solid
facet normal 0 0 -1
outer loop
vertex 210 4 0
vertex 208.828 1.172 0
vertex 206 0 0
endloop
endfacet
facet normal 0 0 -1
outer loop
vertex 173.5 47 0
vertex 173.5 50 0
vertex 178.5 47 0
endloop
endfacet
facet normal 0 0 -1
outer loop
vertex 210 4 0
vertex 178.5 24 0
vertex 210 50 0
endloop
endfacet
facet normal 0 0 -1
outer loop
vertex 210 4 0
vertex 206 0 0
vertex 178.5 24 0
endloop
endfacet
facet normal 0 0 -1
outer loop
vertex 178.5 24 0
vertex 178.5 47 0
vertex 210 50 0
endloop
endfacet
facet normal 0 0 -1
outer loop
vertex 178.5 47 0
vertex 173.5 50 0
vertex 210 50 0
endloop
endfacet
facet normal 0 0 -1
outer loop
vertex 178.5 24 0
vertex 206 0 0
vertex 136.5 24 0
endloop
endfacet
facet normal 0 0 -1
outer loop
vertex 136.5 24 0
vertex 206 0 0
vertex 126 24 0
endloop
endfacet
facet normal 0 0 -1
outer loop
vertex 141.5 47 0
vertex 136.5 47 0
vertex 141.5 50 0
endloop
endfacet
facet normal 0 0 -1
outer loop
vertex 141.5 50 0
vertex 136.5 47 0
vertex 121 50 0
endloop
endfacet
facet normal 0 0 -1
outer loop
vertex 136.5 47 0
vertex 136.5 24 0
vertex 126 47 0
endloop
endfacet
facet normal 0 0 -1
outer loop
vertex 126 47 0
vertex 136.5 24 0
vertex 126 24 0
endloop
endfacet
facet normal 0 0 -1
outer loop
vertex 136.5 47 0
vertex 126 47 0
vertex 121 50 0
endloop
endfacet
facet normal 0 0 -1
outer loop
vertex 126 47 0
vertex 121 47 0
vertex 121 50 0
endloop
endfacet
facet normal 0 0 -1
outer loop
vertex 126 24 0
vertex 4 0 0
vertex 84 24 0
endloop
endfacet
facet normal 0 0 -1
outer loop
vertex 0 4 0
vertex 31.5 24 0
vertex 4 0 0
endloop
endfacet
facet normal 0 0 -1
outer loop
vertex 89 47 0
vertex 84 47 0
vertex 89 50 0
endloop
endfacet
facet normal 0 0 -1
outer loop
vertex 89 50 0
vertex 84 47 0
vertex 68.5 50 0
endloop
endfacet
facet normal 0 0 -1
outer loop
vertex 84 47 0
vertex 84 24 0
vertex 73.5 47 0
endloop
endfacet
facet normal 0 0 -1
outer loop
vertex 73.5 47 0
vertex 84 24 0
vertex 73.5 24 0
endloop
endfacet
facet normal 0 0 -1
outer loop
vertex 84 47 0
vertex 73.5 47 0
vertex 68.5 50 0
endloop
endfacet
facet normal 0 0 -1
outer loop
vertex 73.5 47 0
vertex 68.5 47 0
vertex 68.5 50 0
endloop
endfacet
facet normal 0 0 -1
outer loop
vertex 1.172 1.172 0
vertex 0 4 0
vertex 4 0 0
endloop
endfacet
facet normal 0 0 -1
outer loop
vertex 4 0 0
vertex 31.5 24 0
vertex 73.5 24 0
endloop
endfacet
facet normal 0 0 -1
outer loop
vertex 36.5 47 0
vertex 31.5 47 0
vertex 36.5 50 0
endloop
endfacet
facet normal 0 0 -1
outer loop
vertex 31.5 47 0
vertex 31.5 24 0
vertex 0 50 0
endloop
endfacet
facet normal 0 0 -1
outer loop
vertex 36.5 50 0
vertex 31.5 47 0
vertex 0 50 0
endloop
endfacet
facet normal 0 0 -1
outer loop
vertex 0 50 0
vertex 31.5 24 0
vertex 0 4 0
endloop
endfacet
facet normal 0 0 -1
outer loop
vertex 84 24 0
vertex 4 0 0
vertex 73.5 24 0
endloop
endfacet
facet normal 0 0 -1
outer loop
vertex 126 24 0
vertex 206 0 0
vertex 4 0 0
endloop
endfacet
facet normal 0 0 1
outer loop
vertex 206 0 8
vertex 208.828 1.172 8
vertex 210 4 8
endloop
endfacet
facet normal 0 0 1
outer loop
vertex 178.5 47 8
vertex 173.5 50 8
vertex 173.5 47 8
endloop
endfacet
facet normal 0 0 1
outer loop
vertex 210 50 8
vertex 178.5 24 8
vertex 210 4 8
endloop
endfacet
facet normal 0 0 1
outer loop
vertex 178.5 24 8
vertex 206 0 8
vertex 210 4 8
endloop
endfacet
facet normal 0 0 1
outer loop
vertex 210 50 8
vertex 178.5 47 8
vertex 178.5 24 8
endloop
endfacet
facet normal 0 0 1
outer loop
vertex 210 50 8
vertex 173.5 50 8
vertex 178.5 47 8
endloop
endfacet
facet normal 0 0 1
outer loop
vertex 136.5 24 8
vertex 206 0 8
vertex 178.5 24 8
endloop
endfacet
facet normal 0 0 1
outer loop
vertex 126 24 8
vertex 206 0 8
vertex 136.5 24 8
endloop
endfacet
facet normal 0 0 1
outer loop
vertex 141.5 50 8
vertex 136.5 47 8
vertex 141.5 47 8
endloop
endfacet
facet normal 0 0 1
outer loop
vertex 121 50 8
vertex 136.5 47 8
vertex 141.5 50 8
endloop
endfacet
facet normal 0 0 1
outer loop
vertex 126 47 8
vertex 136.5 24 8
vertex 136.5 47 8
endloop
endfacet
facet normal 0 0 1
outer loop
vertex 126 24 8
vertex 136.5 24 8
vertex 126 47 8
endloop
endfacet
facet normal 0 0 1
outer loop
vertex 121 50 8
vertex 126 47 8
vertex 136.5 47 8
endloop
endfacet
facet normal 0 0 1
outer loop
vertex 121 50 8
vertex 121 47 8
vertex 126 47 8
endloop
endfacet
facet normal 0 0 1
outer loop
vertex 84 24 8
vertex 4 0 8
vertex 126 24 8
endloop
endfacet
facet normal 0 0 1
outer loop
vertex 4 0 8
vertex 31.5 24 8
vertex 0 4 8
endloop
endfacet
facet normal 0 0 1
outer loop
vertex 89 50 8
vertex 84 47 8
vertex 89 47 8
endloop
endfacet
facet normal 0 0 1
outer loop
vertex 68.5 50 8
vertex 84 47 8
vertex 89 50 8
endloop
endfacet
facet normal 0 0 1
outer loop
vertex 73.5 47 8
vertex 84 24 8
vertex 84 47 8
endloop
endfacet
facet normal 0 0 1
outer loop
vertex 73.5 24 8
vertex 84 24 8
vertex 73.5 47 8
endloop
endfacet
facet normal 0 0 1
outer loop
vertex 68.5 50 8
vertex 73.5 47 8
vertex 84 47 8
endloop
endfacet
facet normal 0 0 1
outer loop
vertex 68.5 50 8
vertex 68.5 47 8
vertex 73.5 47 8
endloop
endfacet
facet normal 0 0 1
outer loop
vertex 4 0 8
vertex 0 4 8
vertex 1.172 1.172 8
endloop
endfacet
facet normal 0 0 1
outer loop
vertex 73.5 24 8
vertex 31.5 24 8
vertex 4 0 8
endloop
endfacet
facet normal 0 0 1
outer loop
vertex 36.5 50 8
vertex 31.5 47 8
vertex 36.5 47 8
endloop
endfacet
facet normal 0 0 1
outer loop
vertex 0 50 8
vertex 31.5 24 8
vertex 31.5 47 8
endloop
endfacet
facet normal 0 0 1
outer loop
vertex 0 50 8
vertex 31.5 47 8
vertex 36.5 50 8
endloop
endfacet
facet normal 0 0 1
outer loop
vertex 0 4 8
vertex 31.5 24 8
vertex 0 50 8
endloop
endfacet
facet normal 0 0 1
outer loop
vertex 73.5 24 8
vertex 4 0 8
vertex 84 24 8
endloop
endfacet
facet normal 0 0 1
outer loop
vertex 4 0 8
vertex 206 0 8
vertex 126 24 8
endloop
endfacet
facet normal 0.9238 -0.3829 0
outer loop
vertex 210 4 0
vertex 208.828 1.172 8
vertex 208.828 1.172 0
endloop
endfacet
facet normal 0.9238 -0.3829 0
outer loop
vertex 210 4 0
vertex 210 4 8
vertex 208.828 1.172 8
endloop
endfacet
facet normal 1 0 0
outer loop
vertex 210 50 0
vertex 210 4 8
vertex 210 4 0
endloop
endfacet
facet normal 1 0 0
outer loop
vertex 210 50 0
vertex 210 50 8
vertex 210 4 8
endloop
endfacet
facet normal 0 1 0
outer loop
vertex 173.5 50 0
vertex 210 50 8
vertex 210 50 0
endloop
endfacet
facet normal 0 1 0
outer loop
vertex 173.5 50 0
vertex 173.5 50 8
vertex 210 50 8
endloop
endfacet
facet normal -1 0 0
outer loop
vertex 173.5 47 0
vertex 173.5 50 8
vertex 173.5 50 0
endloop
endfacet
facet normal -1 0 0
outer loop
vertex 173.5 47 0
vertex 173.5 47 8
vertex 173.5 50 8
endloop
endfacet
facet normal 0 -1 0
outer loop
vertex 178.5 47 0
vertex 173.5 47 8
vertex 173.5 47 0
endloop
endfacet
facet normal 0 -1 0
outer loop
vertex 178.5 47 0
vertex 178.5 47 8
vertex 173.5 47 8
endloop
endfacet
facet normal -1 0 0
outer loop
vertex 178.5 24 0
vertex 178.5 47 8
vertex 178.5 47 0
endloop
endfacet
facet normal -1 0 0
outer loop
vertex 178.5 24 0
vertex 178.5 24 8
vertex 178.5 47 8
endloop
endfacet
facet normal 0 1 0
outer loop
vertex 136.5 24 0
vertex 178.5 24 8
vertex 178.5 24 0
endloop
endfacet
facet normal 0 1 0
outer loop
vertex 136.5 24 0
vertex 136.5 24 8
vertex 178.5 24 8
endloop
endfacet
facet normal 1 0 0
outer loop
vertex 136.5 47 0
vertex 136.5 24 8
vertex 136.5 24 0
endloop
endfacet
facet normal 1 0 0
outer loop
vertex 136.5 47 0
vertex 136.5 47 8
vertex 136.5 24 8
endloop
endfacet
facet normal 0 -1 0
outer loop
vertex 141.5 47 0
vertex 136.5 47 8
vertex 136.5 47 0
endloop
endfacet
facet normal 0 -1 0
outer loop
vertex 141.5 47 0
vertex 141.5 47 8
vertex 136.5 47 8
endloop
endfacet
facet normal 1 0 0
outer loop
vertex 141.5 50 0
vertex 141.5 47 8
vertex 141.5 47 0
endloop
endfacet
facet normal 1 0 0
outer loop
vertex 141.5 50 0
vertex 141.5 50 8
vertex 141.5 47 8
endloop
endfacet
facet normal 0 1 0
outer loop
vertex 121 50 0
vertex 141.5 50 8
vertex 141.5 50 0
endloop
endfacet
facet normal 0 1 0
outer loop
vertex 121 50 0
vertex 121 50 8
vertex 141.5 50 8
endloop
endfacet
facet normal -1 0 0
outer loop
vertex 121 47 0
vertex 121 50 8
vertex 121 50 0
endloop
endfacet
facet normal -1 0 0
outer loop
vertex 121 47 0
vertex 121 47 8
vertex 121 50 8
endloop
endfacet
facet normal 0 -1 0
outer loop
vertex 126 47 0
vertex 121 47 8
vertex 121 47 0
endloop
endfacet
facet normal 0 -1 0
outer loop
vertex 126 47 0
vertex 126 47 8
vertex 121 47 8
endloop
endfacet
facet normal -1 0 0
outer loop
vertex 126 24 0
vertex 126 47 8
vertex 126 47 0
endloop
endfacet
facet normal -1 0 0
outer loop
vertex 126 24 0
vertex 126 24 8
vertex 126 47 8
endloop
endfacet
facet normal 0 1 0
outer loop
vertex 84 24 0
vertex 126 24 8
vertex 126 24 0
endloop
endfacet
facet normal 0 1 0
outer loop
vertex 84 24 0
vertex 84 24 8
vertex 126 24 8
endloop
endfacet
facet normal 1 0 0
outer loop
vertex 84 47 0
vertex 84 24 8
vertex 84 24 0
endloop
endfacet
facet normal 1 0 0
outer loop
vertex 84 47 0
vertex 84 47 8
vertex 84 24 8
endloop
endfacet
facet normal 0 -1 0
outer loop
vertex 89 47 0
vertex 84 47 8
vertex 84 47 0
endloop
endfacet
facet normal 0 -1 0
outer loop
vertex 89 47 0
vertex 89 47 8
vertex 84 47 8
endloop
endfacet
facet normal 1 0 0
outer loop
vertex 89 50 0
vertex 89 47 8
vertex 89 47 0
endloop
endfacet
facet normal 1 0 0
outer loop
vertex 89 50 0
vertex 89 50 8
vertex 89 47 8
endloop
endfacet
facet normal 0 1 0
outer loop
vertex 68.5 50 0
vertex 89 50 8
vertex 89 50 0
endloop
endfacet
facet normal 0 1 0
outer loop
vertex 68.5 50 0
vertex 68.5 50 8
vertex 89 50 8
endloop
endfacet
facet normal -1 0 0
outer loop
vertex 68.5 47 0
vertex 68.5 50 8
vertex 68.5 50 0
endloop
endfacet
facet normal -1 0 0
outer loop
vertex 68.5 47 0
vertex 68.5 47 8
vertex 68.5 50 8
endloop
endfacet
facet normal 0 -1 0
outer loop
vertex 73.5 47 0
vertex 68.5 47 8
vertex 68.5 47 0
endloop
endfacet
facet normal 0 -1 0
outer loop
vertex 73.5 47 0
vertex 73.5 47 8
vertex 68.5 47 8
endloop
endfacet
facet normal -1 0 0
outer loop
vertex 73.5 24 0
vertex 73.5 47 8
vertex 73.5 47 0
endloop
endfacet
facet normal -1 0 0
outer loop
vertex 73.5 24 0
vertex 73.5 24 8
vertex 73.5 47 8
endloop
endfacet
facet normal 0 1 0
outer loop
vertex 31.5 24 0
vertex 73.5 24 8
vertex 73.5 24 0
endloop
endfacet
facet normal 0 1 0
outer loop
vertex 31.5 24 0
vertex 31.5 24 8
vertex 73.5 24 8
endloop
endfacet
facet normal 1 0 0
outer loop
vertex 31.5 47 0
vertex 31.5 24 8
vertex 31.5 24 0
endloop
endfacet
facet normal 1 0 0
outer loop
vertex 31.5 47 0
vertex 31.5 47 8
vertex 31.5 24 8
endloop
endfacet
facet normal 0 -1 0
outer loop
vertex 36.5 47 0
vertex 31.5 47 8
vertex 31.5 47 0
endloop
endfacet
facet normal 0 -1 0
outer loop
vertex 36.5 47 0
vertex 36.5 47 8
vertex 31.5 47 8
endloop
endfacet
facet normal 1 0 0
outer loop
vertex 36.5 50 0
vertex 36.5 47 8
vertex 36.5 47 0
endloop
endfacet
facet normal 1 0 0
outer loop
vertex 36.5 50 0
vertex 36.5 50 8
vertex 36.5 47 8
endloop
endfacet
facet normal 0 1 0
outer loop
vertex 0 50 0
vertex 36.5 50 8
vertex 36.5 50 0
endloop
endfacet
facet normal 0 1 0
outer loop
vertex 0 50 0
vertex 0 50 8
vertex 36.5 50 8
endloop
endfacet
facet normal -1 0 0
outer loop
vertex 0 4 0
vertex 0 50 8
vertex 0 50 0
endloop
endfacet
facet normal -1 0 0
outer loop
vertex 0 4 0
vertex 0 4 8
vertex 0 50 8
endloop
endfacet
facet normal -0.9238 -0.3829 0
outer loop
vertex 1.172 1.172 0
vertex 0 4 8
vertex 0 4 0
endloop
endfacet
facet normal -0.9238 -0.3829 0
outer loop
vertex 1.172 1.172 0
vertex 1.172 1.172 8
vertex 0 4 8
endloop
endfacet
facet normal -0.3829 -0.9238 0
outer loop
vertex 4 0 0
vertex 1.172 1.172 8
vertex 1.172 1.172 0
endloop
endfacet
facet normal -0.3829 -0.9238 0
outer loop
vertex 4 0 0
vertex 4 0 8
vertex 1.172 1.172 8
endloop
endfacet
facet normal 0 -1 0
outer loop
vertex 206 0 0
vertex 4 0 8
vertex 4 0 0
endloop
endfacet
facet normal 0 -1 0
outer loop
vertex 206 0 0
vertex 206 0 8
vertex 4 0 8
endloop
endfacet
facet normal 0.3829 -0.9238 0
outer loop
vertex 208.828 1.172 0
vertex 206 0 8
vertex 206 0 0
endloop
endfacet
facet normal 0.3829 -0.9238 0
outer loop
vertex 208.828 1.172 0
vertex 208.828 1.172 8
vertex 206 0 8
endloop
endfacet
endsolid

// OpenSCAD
$fn = 32;

// ----------------------------------------------------------------------
// Oversize slot bar: 210 mm bar with 3 oversize windows
// ----------------------------------------------------------------------

// --- parameters (mm) ---
profile_height = 8;       // extrusion height
profile_points = 32;      // points of the closed outline

profile = [[0, 4], [1.172, 1.172], [4, 0], [206, 0], [208.828, 1.172], [210, 4], [210, 50], [173.5, 50], [173.5, 47], [178.5, 47], [178.5, 24], [136.5, 24], [136.5, 47], [141.5, 47], [141.5, 50], [121, 50], [121, 47], [126, 47], [126, 24], [84, 24], [84, 47], [89, 47], [89, 50], [68.5, 50], [68.5, 47], [73.5, 47], [73.5, 24], [31.5, 24], [31.5, 47], [36.5, 47], [36.5, 50], [0, 50]];  // single closed polygon, 32 points, counter clockwise

// --- the one profile operation ---
linear_extrude(height = profile_height) polygon(points = profile);
